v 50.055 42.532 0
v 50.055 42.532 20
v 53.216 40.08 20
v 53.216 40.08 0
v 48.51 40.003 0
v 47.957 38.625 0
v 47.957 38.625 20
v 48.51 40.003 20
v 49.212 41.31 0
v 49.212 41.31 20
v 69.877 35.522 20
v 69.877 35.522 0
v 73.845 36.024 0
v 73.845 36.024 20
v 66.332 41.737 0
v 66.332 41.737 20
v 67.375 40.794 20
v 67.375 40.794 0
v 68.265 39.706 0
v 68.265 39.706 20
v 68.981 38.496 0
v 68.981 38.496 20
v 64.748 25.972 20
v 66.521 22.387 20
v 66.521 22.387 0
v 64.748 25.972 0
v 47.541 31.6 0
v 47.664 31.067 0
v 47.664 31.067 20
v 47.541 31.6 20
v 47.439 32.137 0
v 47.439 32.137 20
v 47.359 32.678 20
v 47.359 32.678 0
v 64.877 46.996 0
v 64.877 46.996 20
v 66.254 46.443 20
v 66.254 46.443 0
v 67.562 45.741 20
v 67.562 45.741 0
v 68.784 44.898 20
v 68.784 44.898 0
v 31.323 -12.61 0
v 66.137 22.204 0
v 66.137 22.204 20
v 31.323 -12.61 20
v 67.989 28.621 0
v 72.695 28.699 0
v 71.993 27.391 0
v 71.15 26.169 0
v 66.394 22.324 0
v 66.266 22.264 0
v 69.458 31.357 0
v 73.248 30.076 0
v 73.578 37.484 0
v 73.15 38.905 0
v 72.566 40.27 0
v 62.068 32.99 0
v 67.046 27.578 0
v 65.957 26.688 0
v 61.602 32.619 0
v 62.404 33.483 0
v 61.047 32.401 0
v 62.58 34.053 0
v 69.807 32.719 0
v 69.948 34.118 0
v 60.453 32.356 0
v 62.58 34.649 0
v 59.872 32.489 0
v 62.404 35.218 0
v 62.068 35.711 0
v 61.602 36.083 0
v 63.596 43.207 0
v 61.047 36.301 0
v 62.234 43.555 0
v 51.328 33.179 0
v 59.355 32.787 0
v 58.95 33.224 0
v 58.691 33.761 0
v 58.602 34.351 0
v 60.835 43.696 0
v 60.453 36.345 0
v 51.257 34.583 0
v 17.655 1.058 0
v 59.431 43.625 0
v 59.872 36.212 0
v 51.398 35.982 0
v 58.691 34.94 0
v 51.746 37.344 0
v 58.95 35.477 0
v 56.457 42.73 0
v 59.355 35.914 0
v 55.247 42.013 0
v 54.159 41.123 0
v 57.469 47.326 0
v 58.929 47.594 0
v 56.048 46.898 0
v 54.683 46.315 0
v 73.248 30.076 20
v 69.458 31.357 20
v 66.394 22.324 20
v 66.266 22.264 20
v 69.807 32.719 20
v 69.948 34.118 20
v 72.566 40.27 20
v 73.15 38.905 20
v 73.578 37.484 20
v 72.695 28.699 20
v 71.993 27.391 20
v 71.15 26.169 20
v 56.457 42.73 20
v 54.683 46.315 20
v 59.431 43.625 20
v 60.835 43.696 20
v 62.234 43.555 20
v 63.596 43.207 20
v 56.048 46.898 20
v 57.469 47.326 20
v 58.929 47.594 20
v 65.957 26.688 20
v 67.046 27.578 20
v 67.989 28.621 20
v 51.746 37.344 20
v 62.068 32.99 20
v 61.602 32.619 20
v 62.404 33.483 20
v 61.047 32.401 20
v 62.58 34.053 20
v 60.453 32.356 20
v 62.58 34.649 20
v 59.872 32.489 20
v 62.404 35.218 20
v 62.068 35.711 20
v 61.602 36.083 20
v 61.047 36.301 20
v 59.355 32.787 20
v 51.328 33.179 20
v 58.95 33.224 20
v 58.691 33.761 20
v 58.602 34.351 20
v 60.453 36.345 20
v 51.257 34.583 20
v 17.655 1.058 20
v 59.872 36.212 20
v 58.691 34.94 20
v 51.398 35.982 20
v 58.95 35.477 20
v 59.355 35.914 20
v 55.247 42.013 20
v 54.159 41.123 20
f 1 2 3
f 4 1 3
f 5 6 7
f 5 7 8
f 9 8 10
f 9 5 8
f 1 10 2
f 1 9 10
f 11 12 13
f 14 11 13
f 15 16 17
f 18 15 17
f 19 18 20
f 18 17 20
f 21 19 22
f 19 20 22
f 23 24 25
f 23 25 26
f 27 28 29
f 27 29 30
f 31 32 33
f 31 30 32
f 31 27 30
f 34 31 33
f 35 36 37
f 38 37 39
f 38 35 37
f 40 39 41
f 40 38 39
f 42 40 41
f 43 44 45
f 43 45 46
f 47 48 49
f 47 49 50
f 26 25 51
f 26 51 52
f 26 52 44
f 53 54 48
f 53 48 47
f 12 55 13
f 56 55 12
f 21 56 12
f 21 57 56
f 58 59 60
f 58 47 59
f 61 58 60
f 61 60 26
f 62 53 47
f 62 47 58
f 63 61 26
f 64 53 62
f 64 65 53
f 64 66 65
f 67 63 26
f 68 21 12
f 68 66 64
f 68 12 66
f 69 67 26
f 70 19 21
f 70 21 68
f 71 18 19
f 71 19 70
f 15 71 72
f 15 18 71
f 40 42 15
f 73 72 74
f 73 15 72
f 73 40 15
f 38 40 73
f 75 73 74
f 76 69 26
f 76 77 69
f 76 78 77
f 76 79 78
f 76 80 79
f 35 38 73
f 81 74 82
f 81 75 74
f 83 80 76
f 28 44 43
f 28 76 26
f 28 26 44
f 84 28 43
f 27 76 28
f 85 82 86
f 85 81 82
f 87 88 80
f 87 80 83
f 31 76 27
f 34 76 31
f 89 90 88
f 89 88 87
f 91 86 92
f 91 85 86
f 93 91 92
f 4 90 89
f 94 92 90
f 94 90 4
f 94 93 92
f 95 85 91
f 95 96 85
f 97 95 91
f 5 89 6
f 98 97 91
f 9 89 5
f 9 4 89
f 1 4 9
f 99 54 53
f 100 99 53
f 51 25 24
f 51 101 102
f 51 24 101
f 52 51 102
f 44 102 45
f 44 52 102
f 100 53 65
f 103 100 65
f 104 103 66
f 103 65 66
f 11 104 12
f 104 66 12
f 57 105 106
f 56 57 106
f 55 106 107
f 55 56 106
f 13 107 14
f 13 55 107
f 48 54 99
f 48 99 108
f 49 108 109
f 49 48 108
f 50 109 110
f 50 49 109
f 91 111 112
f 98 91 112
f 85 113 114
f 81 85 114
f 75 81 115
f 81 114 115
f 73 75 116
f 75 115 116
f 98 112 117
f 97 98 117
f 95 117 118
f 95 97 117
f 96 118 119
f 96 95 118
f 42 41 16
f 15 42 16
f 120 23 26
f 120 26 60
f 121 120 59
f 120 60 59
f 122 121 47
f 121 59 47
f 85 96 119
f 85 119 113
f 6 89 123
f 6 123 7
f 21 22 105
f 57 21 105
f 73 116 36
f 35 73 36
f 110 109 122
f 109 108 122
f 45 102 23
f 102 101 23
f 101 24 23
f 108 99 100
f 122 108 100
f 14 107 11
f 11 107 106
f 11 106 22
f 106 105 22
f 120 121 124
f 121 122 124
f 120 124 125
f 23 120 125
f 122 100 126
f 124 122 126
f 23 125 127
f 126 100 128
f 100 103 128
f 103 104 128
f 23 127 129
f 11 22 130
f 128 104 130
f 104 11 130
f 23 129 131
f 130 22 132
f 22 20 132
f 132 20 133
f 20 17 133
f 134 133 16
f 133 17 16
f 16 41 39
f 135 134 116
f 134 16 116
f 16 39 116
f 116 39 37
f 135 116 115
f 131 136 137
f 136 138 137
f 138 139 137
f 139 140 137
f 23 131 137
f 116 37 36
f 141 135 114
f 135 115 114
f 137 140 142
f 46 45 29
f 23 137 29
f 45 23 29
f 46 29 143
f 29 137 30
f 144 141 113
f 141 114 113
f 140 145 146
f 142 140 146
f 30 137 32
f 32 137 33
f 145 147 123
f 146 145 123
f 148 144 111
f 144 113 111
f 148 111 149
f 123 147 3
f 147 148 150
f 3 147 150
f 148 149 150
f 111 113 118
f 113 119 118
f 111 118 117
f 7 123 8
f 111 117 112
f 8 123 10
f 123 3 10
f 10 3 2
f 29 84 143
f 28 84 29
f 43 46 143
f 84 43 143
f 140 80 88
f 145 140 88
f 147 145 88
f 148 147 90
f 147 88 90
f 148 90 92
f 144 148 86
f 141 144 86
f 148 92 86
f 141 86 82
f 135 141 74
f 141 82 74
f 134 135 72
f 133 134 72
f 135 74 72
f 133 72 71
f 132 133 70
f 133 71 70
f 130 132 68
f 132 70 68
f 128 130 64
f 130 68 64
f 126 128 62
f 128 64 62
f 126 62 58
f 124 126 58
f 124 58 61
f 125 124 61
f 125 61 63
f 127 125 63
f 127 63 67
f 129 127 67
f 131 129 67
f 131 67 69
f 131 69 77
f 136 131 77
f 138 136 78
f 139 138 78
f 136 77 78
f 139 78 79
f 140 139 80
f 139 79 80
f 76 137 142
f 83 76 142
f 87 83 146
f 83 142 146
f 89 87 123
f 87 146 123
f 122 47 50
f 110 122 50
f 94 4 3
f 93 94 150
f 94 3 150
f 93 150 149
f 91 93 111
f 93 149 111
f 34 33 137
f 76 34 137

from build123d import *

# Parameters (mm, degrees)
SKETCH1_R           = 13.348229866
SKETCH1_R_2         = 2
BOSS_EXTRUDE1_DEPTH = 20
CUT_EXTRUDE4_DEPTH  = 91.243420293
CIRPATTERN7_COUNT   = 4
CIRPATTERN7_ANGLE   = 135
CIRPATTERN9_DEPTH   = 20


# Read off the part's stored shape, not the designer's step: CirPattern9
with BuildPart() as part:
    # Sketch1 → Boss-Extrude1 (new body)
    # profile 1 of 2: a face of its own
    with BuildSketch(Plane.XY):
        with Locations((-60.602362619, 34.350667158)):
            Circle(SKETCH1_R)
        with Locations((-60.602362619, 34.350667158)):
            Circle(SKETCH1_R_2, mode=Mode.SUBTRACT)
    # profile 2 of 2: a face of its own
    with BuildSketch(Plane.XY):
        with BuildLine():
            Line((-66.137497339, 22.204164608), (-31.323181793, -12.610150938))
            Line((-31.323181793, -12.610150938), (-17.655141573, 1.057889282))
            Line((-17.655141573, 1.057889282), (-47.664311726, 31.067059435))
            ThreePointArc((-47.664311726, 31.067059435), (-54.828410927, 22.315854221), (-66.137497339, 22.204164608))
        make_face()
    extrude(amount=BOSS_EXTRUDE1_DEPTH)

    # Sketch2 → Cut-Extrude4 (cut, symmetric)
    with BuildSketch(Plane.XY):
        with BuildLine():
            Line((-169.23850632, 174.404401772), (-68.783555417, 44.897862281))
            Line((-68.783555417, 44.897862281), (-66.331936624, 41.737234923))
            ThreePointArc((-66.331936624, 41.737234923), (-67.840347325, 40.266829683), (-68.981232991, 38.496017917))
            Line((-68.981232991, 38.496017917), (-72.566455217, 40.269765811))
            Line((-72.566455217, 40.269765811), (-219.470747071, 112.948992325))
            Line((-219.470747071, 112.948992325), (-473.273699138, 320.401698382))
            Line((-473.273699138, 320.401698382), (-423.041458386, 381.857107829))
            Line((-423.041458386, 381.857107829), (-169.23850632, 174.404401772))
        make_face()
    cut_extrude4 = extrude(amount=CUT_EXTRUDE4_DEPTH, both=True, mode=Mode.SUBTRACT)

    # CirPattern7: Cut-Extrude4 ×4 about axis
    cirpattern7_axis = Axis((-60.602362619, 34.350667158, 20), (0, 0, -1))
    for i in range(1, CIRPATTERN7_COUNT):
        add(cut_extrude4.rotate(cirpattern7_axis, i * CIRPATTERN7_ANGLE / (CIRPATTERN7_COUNT - 1)), mode=Mode.SUBTRACT)

    # CirPattern9 outline → CirPattern9 (cut)
    with BuildSketch(Plane.XY):
        with BuildLine():
            Line((-73.247688421, 30.076210947), (-69.45832431, 31.357116731))
            ThreePointArc((-69.45832431, 31.357116731), (-69.903749327, 33.41599773), (-69.876875408, 35.522338682))
            Line((-69.876875408, 35.522338682), (-73.845332718, 36.023683446))
            ThreePointArc((-73.845332718, 36.023683446), (-73.883705678, 33.016063436), (-73.247688421, 30.076210947))
        make_face()
        with BuildLine():
            Line((-67.988930384, 28.621093153), (-71.149557741, 26.16947436))
            ThreePointArc((-71.149557741, 26.16947436), (-69.049983017, 24.015632075), (-66.521461271, 22.386574559))
            Line((-66.521461271, 22.386574559), (-64.747713378, 25.971796785))
            ThreePointArc((-64.747713378, 25.971796785), (-66.518525144, 27.112682451), (-67.988930384, 28.621093153))
        make_face()
    extrude(amount=CIRPATTERN9_DEPTH, mode=Mode.SUBTRACT)


with BuildPart() as body_2:
    # Mirror2: mirrored copy
    add(part.part.mirror(Plane(origin=(0, 0, 0), x_dir=(0, 0, 1), z_dir=(1, 0, 0))))


solid = body_2.part
